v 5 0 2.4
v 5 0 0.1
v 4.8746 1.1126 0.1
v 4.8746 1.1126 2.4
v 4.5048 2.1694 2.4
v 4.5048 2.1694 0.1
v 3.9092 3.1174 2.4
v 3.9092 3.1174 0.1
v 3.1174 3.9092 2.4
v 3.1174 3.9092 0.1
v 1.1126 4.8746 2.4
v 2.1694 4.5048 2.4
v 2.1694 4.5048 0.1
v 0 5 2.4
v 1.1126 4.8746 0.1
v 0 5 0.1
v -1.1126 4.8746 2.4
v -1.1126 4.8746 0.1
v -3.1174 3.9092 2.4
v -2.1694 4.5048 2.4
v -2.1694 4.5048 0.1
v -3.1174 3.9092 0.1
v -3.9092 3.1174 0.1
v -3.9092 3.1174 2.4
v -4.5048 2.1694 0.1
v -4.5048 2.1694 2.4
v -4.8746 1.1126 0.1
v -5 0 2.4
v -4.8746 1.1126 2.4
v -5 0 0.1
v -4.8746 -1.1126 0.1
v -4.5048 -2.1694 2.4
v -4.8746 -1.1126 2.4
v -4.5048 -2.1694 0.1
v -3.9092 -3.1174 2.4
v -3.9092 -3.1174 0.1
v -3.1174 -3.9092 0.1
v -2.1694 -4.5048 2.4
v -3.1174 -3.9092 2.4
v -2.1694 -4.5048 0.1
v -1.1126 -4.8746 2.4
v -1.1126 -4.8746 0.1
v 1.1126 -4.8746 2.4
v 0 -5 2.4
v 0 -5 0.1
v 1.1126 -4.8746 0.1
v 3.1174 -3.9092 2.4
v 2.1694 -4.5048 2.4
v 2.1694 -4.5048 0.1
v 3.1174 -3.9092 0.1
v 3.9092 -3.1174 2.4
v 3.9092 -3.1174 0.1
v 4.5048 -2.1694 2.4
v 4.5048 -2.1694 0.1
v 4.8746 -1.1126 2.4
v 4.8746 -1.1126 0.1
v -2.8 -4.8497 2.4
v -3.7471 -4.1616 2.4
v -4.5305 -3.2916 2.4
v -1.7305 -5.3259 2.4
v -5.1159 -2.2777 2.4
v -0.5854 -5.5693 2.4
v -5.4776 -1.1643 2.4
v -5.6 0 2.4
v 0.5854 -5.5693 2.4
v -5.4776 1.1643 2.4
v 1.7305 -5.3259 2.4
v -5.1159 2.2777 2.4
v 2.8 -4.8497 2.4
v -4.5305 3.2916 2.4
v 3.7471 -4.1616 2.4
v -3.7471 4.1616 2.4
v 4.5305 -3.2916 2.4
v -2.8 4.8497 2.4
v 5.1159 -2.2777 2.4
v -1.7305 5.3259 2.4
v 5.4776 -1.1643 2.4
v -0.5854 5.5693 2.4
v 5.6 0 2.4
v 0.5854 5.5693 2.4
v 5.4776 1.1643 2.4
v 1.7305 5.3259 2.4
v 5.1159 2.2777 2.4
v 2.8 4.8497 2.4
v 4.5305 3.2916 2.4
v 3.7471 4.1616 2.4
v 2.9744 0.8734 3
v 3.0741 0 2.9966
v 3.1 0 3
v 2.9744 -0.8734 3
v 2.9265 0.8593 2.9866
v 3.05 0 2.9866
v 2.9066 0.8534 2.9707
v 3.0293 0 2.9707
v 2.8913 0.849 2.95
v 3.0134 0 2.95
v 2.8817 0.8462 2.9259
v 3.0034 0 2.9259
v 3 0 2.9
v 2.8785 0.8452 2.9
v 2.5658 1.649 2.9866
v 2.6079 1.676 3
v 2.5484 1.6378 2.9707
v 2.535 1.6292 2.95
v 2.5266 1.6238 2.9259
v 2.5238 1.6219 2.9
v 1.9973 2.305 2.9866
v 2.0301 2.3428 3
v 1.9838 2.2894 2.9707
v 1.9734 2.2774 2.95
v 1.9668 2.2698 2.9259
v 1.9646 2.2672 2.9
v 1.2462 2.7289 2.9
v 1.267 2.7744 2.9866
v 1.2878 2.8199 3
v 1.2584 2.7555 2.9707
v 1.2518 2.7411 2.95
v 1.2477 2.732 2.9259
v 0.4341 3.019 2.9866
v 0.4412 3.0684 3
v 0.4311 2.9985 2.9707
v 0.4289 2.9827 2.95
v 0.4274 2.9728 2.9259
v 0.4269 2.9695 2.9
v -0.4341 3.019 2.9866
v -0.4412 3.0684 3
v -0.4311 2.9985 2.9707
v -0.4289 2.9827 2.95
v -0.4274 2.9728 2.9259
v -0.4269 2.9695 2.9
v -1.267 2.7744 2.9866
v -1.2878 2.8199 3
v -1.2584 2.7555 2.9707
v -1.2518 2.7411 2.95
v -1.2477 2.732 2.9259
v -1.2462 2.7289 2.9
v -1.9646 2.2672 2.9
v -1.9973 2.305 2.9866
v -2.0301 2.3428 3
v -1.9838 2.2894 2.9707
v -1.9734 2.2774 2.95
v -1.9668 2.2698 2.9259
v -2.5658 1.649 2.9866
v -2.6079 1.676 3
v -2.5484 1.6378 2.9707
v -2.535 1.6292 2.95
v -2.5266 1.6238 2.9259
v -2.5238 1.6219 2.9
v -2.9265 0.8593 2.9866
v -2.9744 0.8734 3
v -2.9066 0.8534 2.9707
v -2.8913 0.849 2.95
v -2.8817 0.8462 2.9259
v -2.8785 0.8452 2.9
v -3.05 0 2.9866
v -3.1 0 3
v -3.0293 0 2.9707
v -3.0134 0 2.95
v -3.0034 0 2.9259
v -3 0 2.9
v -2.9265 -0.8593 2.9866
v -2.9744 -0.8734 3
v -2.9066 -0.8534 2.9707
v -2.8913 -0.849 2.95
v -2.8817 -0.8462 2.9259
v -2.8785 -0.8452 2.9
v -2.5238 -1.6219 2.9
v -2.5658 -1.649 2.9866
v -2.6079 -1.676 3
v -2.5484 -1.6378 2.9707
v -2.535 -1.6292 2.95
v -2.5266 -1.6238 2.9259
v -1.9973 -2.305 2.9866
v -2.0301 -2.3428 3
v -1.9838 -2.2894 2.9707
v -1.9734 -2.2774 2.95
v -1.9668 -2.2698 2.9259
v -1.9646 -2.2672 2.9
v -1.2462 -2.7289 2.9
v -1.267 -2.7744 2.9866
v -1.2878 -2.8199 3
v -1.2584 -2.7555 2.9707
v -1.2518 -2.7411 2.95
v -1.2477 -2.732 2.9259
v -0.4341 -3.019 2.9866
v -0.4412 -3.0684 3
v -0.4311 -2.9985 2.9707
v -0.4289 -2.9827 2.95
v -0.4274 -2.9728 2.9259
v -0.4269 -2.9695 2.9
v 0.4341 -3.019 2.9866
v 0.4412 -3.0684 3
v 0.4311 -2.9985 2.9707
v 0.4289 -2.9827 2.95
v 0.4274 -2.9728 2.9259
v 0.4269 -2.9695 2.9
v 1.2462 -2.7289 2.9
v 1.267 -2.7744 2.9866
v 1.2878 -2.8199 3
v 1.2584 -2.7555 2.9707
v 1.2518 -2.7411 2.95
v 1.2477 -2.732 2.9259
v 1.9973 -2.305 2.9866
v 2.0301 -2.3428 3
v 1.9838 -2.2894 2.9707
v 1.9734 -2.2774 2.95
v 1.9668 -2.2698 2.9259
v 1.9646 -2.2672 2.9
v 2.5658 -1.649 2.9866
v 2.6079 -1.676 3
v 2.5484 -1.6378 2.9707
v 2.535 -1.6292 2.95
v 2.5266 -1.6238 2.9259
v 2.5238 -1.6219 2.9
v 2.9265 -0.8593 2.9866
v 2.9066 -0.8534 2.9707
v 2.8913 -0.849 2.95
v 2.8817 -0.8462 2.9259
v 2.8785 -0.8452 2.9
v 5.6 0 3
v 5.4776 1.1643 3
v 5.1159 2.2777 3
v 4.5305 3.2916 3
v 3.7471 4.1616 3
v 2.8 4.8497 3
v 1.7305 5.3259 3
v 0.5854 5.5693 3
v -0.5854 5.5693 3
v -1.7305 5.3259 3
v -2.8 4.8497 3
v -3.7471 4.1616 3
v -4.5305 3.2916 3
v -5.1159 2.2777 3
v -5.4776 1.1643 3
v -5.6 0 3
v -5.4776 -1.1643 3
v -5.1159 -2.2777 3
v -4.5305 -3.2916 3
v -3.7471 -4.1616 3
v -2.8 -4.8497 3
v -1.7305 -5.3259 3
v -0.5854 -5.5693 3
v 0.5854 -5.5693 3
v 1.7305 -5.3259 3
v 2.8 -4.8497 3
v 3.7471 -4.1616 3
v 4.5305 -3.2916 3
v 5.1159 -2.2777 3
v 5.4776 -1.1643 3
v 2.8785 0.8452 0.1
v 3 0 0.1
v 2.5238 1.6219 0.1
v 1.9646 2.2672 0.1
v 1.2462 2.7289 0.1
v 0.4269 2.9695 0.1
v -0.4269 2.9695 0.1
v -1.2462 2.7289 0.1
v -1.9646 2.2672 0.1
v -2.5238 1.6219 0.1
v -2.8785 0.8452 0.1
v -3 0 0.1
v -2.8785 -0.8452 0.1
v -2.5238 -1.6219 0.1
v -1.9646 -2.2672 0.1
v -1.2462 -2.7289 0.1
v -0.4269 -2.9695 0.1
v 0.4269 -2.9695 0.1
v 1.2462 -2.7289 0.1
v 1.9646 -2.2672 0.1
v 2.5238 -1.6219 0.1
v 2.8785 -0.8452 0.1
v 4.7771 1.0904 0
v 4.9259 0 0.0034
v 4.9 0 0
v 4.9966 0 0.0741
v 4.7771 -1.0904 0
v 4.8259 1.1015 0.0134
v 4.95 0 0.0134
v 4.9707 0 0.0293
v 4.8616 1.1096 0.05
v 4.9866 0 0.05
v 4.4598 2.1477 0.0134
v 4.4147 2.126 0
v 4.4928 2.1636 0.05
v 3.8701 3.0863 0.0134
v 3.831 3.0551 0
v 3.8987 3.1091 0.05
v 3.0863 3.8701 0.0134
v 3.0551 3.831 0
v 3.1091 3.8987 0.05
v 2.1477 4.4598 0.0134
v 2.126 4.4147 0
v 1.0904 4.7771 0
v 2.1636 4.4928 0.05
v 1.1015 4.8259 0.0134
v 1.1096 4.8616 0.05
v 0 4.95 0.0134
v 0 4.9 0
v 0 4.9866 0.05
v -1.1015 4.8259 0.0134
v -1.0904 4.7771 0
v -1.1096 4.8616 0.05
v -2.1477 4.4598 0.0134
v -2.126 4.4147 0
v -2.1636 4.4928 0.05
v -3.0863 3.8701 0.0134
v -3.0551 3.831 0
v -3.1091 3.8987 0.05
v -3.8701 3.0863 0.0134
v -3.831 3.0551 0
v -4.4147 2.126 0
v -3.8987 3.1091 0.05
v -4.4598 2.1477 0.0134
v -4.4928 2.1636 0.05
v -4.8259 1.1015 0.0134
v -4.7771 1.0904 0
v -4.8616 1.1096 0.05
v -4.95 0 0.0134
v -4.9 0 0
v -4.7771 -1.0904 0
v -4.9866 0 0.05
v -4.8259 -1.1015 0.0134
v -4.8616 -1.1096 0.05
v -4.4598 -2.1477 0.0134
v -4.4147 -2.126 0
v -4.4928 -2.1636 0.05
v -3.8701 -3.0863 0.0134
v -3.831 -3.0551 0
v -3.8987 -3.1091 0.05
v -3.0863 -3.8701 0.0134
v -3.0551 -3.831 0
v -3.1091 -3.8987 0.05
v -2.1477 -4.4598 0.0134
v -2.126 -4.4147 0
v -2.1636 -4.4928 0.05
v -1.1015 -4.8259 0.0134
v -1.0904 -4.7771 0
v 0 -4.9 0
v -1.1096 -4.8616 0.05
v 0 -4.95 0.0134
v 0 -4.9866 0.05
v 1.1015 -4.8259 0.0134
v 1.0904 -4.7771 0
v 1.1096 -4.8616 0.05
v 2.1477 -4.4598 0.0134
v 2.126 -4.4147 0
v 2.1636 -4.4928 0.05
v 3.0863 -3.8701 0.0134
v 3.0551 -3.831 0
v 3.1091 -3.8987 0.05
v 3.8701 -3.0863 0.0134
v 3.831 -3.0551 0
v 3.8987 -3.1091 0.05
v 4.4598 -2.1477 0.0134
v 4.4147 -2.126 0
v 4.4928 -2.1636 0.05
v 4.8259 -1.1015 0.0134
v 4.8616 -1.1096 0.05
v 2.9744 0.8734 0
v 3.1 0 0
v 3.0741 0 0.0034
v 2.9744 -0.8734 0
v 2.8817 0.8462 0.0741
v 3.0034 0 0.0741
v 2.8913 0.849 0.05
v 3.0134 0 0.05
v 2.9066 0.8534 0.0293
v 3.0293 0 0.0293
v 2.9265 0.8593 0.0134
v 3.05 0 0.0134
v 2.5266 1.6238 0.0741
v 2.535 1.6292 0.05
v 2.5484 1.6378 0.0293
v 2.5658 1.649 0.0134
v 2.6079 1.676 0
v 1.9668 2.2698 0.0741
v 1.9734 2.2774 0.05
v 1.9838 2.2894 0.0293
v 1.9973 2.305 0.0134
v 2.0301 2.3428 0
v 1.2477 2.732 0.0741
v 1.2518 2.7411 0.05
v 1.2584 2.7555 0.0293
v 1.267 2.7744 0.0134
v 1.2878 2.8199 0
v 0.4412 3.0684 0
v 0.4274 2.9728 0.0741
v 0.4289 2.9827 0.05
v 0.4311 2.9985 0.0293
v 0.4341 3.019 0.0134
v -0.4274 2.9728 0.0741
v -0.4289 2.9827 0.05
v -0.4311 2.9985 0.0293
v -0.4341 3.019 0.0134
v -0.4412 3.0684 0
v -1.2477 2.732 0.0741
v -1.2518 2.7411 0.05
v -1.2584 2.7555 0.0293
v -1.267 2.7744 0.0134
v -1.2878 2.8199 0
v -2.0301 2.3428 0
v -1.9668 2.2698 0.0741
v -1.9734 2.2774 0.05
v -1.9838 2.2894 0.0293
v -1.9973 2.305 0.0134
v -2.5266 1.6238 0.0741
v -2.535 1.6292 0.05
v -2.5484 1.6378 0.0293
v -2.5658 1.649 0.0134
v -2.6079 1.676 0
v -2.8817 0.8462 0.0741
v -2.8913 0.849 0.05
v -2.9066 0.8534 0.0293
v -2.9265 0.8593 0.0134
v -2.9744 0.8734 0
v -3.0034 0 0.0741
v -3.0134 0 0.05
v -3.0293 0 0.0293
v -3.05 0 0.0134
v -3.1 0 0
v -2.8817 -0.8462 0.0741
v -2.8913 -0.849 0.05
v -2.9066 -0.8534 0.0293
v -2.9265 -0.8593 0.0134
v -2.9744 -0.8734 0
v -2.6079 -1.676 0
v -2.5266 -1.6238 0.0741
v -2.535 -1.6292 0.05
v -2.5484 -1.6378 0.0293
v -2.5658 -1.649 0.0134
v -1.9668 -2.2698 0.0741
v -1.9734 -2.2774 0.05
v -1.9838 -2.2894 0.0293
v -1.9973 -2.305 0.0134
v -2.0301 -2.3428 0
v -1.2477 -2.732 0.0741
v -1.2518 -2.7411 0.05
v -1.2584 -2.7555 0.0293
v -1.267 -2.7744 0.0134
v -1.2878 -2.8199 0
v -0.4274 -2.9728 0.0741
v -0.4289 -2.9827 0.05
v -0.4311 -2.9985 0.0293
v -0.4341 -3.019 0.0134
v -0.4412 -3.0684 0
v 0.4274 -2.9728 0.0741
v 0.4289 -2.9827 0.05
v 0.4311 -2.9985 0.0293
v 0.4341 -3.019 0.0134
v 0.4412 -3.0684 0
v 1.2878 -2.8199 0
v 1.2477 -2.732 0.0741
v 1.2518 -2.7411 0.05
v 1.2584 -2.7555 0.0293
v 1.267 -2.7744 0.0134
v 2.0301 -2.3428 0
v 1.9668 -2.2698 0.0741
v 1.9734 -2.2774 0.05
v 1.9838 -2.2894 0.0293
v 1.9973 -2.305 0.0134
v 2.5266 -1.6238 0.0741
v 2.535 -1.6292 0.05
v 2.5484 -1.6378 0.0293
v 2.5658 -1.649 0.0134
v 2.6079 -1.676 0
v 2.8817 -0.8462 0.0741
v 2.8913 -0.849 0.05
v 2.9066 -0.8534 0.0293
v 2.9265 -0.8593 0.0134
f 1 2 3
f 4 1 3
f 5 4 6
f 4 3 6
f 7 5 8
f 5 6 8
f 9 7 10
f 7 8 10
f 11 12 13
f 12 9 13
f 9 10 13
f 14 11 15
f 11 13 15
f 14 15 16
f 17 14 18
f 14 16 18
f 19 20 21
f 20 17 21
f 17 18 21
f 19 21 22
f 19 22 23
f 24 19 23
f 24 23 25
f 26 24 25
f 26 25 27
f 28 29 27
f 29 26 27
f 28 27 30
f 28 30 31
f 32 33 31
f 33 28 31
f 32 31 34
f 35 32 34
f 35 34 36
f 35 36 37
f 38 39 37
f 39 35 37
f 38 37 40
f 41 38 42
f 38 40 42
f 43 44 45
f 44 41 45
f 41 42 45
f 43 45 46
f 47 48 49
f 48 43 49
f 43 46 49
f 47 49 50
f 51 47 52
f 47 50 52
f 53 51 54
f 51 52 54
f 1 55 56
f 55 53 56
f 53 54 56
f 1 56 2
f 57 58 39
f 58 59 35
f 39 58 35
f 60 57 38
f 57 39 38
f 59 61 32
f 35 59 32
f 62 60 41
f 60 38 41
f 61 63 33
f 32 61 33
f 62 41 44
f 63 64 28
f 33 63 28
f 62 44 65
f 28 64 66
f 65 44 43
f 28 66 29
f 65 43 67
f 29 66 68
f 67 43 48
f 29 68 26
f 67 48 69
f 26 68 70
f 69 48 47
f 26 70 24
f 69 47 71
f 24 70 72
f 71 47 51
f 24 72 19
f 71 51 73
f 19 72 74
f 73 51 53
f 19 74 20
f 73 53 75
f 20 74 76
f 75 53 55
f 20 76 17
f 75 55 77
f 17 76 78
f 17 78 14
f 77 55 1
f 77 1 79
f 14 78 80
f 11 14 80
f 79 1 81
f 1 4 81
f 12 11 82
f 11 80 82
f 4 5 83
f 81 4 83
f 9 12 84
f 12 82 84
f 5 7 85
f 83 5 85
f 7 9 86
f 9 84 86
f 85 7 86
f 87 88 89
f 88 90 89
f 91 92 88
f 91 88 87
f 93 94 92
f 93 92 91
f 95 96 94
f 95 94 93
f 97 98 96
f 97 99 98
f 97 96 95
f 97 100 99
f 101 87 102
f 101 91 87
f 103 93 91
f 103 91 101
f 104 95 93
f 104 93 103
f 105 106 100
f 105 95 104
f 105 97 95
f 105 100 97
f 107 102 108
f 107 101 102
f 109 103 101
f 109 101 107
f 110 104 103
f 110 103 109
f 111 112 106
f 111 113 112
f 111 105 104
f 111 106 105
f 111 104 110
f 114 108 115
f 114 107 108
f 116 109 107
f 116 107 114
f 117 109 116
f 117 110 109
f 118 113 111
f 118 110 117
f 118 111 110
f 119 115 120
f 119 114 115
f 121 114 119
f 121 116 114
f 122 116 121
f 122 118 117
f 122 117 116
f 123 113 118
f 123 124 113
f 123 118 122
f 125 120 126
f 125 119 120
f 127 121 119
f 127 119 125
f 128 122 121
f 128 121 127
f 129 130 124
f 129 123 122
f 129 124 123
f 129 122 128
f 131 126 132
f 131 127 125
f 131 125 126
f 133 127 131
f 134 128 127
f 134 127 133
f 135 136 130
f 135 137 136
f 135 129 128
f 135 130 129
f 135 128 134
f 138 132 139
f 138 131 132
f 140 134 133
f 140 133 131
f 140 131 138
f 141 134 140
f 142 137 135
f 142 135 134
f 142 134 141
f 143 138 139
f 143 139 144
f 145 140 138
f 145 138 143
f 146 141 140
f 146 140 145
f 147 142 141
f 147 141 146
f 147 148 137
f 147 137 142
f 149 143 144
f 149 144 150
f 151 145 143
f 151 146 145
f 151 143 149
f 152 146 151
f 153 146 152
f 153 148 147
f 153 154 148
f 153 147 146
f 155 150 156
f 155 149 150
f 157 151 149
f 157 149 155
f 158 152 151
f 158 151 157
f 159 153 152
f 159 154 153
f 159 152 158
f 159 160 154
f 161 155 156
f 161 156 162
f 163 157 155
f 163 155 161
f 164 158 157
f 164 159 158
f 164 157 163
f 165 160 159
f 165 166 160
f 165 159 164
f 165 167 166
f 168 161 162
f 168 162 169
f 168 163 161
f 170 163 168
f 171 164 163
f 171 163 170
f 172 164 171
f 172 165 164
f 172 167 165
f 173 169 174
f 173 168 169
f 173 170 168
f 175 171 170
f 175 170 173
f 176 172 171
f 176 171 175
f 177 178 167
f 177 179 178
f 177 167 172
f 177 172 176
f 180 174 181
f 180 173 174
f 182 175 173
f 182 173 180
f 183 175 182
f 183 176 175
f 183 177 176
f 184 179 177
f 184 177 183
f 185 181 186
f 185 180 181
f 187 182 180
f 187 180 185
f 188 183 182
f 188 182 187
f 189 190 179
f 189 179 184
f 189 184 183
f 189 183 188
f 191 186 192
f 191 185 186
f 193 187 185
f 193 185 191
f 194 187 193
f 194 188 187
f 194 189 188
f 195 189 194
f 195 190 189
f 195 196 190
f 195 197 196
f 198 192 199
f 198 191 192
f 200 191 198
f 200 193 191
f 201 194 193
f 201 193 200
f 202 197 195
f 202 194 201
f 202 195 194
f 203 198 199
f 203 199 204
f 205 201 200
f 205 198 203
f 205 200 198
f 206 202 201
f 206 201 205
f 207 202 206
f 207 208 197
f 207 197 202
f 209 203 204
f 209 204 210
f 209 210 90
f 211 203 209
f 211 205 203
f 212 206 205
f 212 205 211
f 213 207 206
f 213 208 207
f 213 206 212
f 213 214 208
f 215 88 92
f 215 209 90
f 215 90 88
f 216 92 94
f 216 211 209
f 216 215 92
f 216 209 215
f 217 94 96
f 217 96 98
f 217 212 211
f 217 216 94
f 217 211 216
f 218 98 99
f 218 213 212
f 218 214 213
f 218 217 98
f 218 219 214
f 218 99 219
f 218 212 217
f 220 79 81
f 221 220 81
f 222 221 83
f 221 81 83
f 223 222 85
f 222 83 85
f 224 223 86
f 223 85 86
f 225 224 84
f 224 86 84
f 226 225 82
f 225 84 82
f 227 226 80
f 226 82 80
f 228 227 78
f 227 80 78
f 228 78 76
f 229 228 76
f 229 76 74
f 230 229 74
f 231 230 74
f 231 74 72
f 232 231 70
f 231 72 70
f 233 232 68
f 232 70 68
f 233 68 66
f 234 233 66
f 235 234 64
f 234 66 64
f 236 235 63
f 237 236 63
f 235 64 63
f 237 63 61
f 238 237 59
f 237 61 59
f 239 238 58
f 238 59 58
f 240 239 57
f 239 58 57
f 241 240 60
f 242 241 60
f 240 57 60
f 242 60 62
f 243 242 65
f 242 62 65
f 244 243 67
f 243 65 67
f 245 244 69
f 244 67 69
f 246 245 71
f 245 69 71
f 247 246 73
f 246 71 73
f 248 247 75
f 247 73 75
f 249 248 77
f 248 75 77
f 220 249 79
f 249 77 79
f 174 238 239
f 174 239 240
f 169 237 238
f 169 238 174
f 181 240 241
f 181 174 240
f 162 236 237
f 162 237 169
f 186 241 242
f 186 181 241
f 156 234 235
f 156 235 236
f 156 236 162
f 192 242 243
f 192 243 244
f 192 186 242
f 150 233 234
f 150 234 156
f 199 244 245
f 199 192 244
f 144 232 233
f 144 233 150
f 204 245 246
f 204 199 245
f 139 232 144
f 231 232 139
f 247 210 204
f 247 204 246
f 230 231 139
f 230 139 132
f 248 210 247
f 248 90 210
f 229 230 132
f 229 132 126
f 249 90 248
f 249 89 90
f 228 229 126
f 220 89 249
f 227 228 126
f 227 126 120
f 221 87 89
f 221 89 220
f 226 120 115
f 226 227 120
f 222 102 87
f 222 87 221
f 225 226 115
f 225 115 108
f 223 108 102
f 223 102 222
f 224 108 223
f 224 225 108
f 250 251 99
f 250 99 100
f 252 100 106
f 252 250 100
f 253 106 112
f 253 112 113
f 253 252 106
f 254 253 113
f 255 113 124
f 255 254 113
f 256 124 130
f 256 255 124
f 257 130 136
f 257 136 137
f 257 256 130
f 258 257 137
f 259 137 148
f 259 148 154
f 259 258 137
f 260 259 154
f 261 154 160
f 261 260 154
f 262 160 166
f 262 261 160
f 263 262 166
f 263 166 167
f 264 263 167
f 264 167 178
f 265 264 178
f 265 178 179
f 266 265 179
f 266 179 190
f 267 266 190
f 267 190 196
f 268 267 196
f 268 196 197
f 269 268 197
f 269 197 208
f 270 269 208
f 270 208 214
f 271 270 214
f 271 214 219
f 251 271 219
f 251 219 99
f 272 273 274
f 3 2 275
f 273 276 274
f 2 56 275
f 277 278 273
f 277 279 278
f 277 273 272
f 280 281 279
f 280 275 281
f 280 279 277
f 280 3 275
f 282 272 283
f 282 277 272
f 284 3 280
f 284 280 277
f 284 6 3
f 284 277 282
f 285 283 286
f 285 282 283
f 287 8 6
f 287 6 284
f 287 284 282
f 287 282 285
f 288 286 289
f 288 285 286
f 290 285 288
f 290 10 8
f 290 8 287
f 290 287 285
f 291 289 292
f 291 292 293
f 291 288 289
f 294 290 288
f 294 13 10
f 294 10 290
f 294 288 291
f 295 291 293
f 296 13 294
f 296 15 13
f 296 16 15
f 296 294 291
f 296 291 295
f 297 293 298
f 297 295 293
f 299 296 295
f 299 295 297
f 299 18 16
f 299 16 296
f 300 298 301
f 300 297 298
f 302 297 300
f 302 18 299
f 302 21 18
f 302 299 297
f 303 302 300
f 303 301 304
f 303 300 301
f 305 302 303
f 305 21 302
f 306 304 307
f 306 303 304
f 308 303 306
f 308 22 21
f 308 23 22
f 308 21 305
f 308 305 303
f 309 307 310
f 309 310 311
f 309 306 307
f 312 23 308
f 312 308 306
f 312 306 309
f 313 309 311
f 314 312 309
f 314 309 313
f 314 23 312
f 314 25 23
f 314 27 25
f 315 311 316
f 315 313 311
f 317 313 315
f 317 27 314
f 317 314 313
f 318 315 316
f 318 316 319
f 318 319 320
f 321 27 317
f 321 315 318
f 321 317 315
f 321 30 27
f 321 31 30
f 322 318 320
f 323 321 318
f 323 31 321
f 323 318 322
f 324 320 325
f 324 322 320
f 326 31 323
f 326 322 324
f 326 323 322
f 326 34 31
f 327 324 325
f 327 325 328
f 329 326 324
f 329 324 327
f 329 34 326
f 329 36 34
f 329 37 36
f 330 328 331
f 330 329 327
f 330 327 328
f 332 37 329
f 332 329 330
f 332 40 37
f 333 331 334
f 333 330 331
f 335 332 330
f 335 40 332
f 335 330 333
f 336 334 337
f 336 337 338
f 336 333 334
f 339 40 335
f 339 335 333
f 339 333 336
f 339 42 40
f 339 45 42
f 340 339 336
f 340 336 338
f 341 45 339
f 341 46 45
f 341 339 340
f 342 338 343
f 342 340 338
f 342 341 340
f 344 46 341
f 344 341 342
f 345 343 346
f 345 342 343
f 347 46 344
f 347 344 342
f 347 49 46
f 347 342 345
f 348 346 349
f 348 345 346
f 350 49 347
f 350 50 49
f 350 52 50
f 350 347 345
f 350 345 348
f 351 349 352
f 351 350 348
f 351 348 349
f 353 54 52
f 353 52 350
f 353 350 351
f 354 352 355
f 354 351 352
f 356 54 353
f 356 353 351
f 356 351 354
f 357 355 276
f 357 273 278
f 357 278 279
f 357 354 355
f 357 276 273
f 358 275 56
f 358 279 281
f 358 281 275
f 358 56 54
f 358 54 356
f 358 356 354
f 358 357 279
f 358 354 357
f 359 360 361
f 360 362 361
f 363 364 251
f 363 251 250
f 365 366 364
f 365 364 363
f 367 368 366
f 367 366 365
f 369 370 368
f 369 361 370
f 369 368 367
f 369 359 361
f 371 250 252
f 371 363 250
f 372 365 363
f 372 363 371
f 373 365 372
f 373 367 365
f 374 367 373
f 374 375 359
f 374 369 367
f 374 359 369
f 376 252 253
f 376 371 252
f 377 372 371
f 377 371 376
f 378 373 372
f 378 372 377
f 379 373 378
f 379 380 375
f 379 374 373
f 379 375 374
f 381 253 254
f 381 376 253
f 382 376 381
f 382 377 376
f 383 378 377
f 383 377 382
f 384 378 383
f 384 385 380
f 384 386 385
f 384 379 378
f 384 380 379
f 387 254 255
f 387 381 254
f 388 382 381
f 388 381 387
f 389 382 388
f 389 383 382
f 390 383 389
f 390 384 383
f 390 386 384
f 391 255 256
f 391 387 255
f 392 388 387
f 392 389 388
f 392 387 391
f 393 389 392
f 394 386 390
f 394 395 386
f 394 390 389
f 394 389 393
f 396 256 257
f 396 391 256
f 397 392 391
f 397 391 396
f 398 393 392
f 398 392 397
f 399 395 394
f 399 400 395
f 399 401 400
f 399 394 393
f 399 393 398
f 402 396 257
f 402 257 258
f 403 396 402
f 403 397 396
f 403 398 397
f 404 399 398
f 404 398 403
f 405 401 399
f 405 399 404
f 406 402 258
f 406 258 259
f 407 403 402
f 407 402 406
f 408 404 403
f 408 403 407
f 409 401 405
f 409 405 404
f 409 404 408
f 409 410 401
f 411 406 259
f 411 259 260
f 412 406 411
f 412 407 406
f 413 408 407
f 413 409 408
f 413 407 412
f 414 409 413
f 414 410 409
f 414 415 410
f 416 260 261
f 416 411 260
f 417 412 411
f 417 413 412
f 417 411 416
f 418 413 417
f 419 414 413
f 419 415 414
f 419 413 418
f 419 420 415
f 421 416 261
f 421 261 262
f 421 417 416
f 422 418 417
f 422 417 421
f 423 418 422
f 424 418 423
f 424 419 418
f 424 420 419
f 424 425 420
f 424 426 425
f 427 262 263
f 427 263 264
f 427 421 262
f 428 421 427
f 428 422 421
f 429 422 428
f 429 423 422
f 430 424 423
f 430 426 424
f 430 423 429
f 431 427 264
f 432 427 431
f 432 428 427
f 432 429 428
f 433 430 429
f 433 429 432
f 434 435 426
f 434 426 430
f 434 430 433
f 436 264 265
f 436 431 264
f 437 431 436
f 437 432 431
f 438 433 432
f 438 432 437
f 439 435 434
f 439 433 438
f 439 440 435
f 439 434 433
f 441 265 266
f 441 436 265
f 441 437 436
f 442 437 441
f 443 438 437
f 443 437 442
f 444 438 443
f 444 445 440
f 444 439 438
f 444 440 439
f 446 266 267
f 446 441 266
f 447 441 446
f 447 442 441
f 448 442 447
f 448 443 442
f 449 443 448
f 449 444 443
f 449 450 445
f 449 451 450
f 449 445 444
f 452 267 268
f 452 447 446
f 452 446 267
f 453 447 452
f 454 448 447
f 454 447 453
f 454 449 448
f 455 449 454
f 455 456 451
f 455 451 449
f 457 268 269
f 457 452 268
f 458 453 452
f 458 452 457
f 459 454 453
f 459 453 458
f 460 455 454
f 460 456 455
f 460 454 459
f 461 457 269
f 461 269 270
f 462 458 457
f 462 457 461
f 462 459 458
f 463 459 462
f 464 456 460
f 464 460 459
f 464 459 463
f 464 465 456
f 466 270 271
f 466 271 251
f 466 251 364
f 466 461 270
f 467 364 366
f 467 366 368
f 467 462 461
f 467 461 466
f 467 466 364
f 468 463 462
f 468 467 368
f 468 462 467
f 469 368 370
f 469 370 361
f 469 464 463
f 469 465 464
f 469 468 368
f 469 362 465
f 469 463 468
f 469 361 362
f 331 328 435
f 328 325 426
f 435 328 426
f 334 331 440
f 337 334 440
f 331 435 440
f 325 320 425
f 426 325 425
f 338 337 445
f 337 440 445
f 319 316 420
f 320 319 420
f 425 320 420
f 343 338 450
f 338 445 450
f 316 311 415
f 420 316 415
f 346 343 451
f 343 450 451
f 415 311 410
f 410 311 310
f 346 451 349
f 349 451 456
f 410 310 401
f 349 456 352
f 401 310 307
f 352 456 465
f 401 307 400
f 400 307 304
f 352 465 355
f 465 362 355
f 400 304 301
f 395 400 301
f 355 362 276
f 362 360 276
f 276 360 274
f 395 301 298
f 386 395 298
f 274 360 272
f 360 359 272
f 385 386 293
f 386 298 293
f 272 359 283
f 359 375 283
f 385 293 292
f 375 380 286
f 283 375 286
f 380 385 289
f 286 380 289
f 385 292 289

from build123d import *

# Parameters (mm, degrees)
SKETCH_1_R      = 5
SKETCH_1_R_2    = 3
EXTRUDE_1_DEPTH = 3
EXTRUDE_START   = -0.6
SKETCH_2_R      = 5.6
SKETCH_2_R_2    = 3
EXTRUDE_2_DEPTH = 0.6
FILLET_1_R      = 0.1


with BuildPart() as part:
    # ｽｹｯﾁ1 → ﾎﾞｽ - 押し出し1 (new body)
    with BuildSketch(Plane.XY):
        Circle(SKETCH_1_R)
        Circle(SKETCH_1_R_2, mode=Mode.SUBTRACT)
    extrude(amount=EXTRUDE_1_DEPTH)

    # ｽｹｯﾁ2 → ﾎﾞｽ - 押し出し2 (add)
    with BuildSketch(Plane.XY.offset(3).offset(EXTRUDE_START)):
        Circle(SKETCH_2_R)
        Circle(SKETCH_2_R_2, mode=Mode.SUBTRACT)
    extrude(amount=EXTRUDE_2_DEPTH)

    # ﾌｨﾚｯﾄ1
    fillet_1_edges = [part.edges().sort_by_distance(p)[0] for p in [
        (-5, 0, 0),
        (-3, 0, 0),
        (-3, 0, 3),
    ]]
    fillet(fillet_1_edges, radius=FILLET_1_R)


solid = part.part
